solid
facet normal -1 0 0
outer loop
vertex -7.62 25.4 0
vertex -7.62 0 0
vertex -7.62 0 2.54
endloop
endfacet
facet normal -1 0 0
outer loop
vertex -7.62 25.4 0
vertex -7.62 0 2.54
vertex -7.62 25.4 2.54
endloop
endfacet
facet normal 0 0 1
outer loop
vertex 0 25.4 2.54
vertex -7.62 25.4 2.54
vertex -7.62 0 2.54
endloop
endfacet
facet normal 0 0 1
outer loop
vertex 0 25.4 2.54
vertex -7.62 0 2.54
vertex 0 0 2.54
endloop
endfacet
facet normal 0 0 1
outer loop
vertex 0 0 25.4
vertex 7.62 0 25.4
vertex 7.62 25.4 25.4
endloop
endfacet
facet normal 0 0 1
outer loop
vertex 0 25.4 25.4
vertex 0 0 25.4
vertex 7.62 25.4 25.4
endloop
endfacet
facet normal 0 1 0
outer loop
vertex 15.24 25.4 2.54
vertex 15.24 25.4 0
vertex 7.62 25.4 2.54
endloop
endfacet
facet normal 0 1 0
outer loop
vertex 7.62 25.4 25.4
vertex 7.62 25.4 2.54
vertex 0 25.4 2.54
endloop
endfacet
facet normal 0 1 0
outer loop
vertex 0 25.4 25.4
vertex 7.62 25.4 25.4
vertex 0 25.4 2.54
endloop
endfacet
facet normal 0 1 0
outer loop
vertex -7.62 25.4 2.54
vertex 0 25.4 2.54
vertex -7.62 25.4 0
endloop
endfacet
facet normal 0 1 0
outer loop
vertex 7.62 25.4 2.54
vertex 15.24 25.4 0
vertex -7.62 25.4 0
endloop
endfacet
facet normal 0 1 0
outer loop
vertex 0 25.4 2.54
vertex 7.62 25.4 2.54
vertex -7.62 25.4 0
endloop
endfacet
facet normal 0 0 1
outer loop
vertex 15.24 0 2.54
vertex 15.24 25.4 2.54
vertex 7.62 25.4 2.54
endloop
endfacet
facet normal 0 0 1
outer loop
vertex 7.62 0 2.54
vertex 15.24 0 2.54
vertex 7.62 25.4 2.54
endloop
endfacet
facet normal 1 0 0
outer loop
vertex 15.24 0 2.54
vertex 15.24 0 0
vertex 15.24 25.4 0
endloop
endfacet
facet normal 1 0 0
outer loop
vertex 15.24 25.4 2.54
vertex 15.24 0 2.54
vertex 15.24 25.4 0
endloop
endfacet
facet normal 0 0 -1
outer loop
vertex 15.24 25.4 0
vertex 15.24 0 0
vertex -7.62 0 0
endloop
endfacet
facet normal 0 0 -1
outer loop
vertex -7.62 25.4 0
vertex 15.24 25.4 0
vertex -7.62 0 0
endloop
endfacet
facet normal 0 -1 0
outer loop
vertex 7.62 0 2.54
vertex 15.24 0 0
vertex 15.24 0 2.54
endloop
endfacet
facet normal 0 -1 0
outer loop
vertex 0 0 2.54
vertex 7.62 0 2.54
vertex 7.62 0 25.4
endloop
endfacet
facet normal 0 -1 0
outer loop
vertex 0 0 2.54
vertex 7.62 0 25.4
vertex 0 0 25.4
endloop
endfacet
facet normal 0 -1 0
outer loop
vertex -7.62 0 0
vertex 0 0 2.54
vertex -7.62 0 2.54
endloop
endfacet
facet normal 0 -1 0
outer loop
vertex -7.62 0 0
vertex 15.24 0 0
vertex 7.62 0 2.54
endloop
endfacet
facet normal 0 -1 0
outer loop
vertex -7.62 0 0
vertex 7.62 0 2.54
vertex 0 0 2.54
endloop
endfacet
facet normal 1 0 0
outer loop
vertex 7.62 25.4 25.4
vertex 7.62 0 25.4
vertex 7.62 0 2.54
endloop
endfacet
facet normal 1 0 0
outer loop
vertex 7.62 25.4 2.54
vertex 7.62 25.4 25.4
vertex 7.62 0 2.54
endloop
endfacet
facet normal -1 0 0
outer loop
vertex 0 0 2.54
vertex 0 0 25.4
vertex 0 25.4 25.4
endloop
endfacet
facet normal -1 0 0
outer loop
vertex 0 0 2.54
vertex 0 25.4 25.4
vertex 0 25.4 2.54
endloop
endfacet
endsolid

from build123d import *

# Parameters (mm, degrees)
SKETCH1_W           = 25.4
SKETCH1_H           = 25.4
BOSS_EXTRUDE1_DEPTH = 3.81
SKETCH2_W           = 7.62
SKETCH2_H           = 25.4
BOSS_EXTRUDE2_DEPTH = 2.54


with BuildPart() as part:
    # Sketch1 → Boss-Extrude1 (new body)
    with BuildSketch(Plane(origin=(0, 0, 0), x_dir=(0, 0, -1), z_dir=(1, 0, 0))):
        with Locations((-12.7, 12.7)):
            Rectangle(SKETCH1_W, SKETCH1_H)
    boss_extrude1 = extrude(amount=BOSS_EXTRUDE1_DEPTH)

    # Sketch2 → Boss-Extrude2 (add)
    with BuildSketch(Plane.XY):
        with Locations((-3.81, 12.7)):
            Rectangle(SKETCH2_W, SKETCH2_H)
    boss_extrude2 = extrude(amount=BOSS_EXTRUDE2_DEPTH)

    # Mirror2: Boss-Extrude1, Boss-Extrude2 across plane
    add(boss_extrude1.mirror(Plane(origin=(3.81, 0, 0), x_dir=(0, 0, 1), z_dir=(1, 0, 0))))
    add(boss_extrude2.mirror(Plane(origin=(3.81, 0, 0), x_dir=(0, 0, 1), z_dir=(1, 0, 0))))


solid = part.part
